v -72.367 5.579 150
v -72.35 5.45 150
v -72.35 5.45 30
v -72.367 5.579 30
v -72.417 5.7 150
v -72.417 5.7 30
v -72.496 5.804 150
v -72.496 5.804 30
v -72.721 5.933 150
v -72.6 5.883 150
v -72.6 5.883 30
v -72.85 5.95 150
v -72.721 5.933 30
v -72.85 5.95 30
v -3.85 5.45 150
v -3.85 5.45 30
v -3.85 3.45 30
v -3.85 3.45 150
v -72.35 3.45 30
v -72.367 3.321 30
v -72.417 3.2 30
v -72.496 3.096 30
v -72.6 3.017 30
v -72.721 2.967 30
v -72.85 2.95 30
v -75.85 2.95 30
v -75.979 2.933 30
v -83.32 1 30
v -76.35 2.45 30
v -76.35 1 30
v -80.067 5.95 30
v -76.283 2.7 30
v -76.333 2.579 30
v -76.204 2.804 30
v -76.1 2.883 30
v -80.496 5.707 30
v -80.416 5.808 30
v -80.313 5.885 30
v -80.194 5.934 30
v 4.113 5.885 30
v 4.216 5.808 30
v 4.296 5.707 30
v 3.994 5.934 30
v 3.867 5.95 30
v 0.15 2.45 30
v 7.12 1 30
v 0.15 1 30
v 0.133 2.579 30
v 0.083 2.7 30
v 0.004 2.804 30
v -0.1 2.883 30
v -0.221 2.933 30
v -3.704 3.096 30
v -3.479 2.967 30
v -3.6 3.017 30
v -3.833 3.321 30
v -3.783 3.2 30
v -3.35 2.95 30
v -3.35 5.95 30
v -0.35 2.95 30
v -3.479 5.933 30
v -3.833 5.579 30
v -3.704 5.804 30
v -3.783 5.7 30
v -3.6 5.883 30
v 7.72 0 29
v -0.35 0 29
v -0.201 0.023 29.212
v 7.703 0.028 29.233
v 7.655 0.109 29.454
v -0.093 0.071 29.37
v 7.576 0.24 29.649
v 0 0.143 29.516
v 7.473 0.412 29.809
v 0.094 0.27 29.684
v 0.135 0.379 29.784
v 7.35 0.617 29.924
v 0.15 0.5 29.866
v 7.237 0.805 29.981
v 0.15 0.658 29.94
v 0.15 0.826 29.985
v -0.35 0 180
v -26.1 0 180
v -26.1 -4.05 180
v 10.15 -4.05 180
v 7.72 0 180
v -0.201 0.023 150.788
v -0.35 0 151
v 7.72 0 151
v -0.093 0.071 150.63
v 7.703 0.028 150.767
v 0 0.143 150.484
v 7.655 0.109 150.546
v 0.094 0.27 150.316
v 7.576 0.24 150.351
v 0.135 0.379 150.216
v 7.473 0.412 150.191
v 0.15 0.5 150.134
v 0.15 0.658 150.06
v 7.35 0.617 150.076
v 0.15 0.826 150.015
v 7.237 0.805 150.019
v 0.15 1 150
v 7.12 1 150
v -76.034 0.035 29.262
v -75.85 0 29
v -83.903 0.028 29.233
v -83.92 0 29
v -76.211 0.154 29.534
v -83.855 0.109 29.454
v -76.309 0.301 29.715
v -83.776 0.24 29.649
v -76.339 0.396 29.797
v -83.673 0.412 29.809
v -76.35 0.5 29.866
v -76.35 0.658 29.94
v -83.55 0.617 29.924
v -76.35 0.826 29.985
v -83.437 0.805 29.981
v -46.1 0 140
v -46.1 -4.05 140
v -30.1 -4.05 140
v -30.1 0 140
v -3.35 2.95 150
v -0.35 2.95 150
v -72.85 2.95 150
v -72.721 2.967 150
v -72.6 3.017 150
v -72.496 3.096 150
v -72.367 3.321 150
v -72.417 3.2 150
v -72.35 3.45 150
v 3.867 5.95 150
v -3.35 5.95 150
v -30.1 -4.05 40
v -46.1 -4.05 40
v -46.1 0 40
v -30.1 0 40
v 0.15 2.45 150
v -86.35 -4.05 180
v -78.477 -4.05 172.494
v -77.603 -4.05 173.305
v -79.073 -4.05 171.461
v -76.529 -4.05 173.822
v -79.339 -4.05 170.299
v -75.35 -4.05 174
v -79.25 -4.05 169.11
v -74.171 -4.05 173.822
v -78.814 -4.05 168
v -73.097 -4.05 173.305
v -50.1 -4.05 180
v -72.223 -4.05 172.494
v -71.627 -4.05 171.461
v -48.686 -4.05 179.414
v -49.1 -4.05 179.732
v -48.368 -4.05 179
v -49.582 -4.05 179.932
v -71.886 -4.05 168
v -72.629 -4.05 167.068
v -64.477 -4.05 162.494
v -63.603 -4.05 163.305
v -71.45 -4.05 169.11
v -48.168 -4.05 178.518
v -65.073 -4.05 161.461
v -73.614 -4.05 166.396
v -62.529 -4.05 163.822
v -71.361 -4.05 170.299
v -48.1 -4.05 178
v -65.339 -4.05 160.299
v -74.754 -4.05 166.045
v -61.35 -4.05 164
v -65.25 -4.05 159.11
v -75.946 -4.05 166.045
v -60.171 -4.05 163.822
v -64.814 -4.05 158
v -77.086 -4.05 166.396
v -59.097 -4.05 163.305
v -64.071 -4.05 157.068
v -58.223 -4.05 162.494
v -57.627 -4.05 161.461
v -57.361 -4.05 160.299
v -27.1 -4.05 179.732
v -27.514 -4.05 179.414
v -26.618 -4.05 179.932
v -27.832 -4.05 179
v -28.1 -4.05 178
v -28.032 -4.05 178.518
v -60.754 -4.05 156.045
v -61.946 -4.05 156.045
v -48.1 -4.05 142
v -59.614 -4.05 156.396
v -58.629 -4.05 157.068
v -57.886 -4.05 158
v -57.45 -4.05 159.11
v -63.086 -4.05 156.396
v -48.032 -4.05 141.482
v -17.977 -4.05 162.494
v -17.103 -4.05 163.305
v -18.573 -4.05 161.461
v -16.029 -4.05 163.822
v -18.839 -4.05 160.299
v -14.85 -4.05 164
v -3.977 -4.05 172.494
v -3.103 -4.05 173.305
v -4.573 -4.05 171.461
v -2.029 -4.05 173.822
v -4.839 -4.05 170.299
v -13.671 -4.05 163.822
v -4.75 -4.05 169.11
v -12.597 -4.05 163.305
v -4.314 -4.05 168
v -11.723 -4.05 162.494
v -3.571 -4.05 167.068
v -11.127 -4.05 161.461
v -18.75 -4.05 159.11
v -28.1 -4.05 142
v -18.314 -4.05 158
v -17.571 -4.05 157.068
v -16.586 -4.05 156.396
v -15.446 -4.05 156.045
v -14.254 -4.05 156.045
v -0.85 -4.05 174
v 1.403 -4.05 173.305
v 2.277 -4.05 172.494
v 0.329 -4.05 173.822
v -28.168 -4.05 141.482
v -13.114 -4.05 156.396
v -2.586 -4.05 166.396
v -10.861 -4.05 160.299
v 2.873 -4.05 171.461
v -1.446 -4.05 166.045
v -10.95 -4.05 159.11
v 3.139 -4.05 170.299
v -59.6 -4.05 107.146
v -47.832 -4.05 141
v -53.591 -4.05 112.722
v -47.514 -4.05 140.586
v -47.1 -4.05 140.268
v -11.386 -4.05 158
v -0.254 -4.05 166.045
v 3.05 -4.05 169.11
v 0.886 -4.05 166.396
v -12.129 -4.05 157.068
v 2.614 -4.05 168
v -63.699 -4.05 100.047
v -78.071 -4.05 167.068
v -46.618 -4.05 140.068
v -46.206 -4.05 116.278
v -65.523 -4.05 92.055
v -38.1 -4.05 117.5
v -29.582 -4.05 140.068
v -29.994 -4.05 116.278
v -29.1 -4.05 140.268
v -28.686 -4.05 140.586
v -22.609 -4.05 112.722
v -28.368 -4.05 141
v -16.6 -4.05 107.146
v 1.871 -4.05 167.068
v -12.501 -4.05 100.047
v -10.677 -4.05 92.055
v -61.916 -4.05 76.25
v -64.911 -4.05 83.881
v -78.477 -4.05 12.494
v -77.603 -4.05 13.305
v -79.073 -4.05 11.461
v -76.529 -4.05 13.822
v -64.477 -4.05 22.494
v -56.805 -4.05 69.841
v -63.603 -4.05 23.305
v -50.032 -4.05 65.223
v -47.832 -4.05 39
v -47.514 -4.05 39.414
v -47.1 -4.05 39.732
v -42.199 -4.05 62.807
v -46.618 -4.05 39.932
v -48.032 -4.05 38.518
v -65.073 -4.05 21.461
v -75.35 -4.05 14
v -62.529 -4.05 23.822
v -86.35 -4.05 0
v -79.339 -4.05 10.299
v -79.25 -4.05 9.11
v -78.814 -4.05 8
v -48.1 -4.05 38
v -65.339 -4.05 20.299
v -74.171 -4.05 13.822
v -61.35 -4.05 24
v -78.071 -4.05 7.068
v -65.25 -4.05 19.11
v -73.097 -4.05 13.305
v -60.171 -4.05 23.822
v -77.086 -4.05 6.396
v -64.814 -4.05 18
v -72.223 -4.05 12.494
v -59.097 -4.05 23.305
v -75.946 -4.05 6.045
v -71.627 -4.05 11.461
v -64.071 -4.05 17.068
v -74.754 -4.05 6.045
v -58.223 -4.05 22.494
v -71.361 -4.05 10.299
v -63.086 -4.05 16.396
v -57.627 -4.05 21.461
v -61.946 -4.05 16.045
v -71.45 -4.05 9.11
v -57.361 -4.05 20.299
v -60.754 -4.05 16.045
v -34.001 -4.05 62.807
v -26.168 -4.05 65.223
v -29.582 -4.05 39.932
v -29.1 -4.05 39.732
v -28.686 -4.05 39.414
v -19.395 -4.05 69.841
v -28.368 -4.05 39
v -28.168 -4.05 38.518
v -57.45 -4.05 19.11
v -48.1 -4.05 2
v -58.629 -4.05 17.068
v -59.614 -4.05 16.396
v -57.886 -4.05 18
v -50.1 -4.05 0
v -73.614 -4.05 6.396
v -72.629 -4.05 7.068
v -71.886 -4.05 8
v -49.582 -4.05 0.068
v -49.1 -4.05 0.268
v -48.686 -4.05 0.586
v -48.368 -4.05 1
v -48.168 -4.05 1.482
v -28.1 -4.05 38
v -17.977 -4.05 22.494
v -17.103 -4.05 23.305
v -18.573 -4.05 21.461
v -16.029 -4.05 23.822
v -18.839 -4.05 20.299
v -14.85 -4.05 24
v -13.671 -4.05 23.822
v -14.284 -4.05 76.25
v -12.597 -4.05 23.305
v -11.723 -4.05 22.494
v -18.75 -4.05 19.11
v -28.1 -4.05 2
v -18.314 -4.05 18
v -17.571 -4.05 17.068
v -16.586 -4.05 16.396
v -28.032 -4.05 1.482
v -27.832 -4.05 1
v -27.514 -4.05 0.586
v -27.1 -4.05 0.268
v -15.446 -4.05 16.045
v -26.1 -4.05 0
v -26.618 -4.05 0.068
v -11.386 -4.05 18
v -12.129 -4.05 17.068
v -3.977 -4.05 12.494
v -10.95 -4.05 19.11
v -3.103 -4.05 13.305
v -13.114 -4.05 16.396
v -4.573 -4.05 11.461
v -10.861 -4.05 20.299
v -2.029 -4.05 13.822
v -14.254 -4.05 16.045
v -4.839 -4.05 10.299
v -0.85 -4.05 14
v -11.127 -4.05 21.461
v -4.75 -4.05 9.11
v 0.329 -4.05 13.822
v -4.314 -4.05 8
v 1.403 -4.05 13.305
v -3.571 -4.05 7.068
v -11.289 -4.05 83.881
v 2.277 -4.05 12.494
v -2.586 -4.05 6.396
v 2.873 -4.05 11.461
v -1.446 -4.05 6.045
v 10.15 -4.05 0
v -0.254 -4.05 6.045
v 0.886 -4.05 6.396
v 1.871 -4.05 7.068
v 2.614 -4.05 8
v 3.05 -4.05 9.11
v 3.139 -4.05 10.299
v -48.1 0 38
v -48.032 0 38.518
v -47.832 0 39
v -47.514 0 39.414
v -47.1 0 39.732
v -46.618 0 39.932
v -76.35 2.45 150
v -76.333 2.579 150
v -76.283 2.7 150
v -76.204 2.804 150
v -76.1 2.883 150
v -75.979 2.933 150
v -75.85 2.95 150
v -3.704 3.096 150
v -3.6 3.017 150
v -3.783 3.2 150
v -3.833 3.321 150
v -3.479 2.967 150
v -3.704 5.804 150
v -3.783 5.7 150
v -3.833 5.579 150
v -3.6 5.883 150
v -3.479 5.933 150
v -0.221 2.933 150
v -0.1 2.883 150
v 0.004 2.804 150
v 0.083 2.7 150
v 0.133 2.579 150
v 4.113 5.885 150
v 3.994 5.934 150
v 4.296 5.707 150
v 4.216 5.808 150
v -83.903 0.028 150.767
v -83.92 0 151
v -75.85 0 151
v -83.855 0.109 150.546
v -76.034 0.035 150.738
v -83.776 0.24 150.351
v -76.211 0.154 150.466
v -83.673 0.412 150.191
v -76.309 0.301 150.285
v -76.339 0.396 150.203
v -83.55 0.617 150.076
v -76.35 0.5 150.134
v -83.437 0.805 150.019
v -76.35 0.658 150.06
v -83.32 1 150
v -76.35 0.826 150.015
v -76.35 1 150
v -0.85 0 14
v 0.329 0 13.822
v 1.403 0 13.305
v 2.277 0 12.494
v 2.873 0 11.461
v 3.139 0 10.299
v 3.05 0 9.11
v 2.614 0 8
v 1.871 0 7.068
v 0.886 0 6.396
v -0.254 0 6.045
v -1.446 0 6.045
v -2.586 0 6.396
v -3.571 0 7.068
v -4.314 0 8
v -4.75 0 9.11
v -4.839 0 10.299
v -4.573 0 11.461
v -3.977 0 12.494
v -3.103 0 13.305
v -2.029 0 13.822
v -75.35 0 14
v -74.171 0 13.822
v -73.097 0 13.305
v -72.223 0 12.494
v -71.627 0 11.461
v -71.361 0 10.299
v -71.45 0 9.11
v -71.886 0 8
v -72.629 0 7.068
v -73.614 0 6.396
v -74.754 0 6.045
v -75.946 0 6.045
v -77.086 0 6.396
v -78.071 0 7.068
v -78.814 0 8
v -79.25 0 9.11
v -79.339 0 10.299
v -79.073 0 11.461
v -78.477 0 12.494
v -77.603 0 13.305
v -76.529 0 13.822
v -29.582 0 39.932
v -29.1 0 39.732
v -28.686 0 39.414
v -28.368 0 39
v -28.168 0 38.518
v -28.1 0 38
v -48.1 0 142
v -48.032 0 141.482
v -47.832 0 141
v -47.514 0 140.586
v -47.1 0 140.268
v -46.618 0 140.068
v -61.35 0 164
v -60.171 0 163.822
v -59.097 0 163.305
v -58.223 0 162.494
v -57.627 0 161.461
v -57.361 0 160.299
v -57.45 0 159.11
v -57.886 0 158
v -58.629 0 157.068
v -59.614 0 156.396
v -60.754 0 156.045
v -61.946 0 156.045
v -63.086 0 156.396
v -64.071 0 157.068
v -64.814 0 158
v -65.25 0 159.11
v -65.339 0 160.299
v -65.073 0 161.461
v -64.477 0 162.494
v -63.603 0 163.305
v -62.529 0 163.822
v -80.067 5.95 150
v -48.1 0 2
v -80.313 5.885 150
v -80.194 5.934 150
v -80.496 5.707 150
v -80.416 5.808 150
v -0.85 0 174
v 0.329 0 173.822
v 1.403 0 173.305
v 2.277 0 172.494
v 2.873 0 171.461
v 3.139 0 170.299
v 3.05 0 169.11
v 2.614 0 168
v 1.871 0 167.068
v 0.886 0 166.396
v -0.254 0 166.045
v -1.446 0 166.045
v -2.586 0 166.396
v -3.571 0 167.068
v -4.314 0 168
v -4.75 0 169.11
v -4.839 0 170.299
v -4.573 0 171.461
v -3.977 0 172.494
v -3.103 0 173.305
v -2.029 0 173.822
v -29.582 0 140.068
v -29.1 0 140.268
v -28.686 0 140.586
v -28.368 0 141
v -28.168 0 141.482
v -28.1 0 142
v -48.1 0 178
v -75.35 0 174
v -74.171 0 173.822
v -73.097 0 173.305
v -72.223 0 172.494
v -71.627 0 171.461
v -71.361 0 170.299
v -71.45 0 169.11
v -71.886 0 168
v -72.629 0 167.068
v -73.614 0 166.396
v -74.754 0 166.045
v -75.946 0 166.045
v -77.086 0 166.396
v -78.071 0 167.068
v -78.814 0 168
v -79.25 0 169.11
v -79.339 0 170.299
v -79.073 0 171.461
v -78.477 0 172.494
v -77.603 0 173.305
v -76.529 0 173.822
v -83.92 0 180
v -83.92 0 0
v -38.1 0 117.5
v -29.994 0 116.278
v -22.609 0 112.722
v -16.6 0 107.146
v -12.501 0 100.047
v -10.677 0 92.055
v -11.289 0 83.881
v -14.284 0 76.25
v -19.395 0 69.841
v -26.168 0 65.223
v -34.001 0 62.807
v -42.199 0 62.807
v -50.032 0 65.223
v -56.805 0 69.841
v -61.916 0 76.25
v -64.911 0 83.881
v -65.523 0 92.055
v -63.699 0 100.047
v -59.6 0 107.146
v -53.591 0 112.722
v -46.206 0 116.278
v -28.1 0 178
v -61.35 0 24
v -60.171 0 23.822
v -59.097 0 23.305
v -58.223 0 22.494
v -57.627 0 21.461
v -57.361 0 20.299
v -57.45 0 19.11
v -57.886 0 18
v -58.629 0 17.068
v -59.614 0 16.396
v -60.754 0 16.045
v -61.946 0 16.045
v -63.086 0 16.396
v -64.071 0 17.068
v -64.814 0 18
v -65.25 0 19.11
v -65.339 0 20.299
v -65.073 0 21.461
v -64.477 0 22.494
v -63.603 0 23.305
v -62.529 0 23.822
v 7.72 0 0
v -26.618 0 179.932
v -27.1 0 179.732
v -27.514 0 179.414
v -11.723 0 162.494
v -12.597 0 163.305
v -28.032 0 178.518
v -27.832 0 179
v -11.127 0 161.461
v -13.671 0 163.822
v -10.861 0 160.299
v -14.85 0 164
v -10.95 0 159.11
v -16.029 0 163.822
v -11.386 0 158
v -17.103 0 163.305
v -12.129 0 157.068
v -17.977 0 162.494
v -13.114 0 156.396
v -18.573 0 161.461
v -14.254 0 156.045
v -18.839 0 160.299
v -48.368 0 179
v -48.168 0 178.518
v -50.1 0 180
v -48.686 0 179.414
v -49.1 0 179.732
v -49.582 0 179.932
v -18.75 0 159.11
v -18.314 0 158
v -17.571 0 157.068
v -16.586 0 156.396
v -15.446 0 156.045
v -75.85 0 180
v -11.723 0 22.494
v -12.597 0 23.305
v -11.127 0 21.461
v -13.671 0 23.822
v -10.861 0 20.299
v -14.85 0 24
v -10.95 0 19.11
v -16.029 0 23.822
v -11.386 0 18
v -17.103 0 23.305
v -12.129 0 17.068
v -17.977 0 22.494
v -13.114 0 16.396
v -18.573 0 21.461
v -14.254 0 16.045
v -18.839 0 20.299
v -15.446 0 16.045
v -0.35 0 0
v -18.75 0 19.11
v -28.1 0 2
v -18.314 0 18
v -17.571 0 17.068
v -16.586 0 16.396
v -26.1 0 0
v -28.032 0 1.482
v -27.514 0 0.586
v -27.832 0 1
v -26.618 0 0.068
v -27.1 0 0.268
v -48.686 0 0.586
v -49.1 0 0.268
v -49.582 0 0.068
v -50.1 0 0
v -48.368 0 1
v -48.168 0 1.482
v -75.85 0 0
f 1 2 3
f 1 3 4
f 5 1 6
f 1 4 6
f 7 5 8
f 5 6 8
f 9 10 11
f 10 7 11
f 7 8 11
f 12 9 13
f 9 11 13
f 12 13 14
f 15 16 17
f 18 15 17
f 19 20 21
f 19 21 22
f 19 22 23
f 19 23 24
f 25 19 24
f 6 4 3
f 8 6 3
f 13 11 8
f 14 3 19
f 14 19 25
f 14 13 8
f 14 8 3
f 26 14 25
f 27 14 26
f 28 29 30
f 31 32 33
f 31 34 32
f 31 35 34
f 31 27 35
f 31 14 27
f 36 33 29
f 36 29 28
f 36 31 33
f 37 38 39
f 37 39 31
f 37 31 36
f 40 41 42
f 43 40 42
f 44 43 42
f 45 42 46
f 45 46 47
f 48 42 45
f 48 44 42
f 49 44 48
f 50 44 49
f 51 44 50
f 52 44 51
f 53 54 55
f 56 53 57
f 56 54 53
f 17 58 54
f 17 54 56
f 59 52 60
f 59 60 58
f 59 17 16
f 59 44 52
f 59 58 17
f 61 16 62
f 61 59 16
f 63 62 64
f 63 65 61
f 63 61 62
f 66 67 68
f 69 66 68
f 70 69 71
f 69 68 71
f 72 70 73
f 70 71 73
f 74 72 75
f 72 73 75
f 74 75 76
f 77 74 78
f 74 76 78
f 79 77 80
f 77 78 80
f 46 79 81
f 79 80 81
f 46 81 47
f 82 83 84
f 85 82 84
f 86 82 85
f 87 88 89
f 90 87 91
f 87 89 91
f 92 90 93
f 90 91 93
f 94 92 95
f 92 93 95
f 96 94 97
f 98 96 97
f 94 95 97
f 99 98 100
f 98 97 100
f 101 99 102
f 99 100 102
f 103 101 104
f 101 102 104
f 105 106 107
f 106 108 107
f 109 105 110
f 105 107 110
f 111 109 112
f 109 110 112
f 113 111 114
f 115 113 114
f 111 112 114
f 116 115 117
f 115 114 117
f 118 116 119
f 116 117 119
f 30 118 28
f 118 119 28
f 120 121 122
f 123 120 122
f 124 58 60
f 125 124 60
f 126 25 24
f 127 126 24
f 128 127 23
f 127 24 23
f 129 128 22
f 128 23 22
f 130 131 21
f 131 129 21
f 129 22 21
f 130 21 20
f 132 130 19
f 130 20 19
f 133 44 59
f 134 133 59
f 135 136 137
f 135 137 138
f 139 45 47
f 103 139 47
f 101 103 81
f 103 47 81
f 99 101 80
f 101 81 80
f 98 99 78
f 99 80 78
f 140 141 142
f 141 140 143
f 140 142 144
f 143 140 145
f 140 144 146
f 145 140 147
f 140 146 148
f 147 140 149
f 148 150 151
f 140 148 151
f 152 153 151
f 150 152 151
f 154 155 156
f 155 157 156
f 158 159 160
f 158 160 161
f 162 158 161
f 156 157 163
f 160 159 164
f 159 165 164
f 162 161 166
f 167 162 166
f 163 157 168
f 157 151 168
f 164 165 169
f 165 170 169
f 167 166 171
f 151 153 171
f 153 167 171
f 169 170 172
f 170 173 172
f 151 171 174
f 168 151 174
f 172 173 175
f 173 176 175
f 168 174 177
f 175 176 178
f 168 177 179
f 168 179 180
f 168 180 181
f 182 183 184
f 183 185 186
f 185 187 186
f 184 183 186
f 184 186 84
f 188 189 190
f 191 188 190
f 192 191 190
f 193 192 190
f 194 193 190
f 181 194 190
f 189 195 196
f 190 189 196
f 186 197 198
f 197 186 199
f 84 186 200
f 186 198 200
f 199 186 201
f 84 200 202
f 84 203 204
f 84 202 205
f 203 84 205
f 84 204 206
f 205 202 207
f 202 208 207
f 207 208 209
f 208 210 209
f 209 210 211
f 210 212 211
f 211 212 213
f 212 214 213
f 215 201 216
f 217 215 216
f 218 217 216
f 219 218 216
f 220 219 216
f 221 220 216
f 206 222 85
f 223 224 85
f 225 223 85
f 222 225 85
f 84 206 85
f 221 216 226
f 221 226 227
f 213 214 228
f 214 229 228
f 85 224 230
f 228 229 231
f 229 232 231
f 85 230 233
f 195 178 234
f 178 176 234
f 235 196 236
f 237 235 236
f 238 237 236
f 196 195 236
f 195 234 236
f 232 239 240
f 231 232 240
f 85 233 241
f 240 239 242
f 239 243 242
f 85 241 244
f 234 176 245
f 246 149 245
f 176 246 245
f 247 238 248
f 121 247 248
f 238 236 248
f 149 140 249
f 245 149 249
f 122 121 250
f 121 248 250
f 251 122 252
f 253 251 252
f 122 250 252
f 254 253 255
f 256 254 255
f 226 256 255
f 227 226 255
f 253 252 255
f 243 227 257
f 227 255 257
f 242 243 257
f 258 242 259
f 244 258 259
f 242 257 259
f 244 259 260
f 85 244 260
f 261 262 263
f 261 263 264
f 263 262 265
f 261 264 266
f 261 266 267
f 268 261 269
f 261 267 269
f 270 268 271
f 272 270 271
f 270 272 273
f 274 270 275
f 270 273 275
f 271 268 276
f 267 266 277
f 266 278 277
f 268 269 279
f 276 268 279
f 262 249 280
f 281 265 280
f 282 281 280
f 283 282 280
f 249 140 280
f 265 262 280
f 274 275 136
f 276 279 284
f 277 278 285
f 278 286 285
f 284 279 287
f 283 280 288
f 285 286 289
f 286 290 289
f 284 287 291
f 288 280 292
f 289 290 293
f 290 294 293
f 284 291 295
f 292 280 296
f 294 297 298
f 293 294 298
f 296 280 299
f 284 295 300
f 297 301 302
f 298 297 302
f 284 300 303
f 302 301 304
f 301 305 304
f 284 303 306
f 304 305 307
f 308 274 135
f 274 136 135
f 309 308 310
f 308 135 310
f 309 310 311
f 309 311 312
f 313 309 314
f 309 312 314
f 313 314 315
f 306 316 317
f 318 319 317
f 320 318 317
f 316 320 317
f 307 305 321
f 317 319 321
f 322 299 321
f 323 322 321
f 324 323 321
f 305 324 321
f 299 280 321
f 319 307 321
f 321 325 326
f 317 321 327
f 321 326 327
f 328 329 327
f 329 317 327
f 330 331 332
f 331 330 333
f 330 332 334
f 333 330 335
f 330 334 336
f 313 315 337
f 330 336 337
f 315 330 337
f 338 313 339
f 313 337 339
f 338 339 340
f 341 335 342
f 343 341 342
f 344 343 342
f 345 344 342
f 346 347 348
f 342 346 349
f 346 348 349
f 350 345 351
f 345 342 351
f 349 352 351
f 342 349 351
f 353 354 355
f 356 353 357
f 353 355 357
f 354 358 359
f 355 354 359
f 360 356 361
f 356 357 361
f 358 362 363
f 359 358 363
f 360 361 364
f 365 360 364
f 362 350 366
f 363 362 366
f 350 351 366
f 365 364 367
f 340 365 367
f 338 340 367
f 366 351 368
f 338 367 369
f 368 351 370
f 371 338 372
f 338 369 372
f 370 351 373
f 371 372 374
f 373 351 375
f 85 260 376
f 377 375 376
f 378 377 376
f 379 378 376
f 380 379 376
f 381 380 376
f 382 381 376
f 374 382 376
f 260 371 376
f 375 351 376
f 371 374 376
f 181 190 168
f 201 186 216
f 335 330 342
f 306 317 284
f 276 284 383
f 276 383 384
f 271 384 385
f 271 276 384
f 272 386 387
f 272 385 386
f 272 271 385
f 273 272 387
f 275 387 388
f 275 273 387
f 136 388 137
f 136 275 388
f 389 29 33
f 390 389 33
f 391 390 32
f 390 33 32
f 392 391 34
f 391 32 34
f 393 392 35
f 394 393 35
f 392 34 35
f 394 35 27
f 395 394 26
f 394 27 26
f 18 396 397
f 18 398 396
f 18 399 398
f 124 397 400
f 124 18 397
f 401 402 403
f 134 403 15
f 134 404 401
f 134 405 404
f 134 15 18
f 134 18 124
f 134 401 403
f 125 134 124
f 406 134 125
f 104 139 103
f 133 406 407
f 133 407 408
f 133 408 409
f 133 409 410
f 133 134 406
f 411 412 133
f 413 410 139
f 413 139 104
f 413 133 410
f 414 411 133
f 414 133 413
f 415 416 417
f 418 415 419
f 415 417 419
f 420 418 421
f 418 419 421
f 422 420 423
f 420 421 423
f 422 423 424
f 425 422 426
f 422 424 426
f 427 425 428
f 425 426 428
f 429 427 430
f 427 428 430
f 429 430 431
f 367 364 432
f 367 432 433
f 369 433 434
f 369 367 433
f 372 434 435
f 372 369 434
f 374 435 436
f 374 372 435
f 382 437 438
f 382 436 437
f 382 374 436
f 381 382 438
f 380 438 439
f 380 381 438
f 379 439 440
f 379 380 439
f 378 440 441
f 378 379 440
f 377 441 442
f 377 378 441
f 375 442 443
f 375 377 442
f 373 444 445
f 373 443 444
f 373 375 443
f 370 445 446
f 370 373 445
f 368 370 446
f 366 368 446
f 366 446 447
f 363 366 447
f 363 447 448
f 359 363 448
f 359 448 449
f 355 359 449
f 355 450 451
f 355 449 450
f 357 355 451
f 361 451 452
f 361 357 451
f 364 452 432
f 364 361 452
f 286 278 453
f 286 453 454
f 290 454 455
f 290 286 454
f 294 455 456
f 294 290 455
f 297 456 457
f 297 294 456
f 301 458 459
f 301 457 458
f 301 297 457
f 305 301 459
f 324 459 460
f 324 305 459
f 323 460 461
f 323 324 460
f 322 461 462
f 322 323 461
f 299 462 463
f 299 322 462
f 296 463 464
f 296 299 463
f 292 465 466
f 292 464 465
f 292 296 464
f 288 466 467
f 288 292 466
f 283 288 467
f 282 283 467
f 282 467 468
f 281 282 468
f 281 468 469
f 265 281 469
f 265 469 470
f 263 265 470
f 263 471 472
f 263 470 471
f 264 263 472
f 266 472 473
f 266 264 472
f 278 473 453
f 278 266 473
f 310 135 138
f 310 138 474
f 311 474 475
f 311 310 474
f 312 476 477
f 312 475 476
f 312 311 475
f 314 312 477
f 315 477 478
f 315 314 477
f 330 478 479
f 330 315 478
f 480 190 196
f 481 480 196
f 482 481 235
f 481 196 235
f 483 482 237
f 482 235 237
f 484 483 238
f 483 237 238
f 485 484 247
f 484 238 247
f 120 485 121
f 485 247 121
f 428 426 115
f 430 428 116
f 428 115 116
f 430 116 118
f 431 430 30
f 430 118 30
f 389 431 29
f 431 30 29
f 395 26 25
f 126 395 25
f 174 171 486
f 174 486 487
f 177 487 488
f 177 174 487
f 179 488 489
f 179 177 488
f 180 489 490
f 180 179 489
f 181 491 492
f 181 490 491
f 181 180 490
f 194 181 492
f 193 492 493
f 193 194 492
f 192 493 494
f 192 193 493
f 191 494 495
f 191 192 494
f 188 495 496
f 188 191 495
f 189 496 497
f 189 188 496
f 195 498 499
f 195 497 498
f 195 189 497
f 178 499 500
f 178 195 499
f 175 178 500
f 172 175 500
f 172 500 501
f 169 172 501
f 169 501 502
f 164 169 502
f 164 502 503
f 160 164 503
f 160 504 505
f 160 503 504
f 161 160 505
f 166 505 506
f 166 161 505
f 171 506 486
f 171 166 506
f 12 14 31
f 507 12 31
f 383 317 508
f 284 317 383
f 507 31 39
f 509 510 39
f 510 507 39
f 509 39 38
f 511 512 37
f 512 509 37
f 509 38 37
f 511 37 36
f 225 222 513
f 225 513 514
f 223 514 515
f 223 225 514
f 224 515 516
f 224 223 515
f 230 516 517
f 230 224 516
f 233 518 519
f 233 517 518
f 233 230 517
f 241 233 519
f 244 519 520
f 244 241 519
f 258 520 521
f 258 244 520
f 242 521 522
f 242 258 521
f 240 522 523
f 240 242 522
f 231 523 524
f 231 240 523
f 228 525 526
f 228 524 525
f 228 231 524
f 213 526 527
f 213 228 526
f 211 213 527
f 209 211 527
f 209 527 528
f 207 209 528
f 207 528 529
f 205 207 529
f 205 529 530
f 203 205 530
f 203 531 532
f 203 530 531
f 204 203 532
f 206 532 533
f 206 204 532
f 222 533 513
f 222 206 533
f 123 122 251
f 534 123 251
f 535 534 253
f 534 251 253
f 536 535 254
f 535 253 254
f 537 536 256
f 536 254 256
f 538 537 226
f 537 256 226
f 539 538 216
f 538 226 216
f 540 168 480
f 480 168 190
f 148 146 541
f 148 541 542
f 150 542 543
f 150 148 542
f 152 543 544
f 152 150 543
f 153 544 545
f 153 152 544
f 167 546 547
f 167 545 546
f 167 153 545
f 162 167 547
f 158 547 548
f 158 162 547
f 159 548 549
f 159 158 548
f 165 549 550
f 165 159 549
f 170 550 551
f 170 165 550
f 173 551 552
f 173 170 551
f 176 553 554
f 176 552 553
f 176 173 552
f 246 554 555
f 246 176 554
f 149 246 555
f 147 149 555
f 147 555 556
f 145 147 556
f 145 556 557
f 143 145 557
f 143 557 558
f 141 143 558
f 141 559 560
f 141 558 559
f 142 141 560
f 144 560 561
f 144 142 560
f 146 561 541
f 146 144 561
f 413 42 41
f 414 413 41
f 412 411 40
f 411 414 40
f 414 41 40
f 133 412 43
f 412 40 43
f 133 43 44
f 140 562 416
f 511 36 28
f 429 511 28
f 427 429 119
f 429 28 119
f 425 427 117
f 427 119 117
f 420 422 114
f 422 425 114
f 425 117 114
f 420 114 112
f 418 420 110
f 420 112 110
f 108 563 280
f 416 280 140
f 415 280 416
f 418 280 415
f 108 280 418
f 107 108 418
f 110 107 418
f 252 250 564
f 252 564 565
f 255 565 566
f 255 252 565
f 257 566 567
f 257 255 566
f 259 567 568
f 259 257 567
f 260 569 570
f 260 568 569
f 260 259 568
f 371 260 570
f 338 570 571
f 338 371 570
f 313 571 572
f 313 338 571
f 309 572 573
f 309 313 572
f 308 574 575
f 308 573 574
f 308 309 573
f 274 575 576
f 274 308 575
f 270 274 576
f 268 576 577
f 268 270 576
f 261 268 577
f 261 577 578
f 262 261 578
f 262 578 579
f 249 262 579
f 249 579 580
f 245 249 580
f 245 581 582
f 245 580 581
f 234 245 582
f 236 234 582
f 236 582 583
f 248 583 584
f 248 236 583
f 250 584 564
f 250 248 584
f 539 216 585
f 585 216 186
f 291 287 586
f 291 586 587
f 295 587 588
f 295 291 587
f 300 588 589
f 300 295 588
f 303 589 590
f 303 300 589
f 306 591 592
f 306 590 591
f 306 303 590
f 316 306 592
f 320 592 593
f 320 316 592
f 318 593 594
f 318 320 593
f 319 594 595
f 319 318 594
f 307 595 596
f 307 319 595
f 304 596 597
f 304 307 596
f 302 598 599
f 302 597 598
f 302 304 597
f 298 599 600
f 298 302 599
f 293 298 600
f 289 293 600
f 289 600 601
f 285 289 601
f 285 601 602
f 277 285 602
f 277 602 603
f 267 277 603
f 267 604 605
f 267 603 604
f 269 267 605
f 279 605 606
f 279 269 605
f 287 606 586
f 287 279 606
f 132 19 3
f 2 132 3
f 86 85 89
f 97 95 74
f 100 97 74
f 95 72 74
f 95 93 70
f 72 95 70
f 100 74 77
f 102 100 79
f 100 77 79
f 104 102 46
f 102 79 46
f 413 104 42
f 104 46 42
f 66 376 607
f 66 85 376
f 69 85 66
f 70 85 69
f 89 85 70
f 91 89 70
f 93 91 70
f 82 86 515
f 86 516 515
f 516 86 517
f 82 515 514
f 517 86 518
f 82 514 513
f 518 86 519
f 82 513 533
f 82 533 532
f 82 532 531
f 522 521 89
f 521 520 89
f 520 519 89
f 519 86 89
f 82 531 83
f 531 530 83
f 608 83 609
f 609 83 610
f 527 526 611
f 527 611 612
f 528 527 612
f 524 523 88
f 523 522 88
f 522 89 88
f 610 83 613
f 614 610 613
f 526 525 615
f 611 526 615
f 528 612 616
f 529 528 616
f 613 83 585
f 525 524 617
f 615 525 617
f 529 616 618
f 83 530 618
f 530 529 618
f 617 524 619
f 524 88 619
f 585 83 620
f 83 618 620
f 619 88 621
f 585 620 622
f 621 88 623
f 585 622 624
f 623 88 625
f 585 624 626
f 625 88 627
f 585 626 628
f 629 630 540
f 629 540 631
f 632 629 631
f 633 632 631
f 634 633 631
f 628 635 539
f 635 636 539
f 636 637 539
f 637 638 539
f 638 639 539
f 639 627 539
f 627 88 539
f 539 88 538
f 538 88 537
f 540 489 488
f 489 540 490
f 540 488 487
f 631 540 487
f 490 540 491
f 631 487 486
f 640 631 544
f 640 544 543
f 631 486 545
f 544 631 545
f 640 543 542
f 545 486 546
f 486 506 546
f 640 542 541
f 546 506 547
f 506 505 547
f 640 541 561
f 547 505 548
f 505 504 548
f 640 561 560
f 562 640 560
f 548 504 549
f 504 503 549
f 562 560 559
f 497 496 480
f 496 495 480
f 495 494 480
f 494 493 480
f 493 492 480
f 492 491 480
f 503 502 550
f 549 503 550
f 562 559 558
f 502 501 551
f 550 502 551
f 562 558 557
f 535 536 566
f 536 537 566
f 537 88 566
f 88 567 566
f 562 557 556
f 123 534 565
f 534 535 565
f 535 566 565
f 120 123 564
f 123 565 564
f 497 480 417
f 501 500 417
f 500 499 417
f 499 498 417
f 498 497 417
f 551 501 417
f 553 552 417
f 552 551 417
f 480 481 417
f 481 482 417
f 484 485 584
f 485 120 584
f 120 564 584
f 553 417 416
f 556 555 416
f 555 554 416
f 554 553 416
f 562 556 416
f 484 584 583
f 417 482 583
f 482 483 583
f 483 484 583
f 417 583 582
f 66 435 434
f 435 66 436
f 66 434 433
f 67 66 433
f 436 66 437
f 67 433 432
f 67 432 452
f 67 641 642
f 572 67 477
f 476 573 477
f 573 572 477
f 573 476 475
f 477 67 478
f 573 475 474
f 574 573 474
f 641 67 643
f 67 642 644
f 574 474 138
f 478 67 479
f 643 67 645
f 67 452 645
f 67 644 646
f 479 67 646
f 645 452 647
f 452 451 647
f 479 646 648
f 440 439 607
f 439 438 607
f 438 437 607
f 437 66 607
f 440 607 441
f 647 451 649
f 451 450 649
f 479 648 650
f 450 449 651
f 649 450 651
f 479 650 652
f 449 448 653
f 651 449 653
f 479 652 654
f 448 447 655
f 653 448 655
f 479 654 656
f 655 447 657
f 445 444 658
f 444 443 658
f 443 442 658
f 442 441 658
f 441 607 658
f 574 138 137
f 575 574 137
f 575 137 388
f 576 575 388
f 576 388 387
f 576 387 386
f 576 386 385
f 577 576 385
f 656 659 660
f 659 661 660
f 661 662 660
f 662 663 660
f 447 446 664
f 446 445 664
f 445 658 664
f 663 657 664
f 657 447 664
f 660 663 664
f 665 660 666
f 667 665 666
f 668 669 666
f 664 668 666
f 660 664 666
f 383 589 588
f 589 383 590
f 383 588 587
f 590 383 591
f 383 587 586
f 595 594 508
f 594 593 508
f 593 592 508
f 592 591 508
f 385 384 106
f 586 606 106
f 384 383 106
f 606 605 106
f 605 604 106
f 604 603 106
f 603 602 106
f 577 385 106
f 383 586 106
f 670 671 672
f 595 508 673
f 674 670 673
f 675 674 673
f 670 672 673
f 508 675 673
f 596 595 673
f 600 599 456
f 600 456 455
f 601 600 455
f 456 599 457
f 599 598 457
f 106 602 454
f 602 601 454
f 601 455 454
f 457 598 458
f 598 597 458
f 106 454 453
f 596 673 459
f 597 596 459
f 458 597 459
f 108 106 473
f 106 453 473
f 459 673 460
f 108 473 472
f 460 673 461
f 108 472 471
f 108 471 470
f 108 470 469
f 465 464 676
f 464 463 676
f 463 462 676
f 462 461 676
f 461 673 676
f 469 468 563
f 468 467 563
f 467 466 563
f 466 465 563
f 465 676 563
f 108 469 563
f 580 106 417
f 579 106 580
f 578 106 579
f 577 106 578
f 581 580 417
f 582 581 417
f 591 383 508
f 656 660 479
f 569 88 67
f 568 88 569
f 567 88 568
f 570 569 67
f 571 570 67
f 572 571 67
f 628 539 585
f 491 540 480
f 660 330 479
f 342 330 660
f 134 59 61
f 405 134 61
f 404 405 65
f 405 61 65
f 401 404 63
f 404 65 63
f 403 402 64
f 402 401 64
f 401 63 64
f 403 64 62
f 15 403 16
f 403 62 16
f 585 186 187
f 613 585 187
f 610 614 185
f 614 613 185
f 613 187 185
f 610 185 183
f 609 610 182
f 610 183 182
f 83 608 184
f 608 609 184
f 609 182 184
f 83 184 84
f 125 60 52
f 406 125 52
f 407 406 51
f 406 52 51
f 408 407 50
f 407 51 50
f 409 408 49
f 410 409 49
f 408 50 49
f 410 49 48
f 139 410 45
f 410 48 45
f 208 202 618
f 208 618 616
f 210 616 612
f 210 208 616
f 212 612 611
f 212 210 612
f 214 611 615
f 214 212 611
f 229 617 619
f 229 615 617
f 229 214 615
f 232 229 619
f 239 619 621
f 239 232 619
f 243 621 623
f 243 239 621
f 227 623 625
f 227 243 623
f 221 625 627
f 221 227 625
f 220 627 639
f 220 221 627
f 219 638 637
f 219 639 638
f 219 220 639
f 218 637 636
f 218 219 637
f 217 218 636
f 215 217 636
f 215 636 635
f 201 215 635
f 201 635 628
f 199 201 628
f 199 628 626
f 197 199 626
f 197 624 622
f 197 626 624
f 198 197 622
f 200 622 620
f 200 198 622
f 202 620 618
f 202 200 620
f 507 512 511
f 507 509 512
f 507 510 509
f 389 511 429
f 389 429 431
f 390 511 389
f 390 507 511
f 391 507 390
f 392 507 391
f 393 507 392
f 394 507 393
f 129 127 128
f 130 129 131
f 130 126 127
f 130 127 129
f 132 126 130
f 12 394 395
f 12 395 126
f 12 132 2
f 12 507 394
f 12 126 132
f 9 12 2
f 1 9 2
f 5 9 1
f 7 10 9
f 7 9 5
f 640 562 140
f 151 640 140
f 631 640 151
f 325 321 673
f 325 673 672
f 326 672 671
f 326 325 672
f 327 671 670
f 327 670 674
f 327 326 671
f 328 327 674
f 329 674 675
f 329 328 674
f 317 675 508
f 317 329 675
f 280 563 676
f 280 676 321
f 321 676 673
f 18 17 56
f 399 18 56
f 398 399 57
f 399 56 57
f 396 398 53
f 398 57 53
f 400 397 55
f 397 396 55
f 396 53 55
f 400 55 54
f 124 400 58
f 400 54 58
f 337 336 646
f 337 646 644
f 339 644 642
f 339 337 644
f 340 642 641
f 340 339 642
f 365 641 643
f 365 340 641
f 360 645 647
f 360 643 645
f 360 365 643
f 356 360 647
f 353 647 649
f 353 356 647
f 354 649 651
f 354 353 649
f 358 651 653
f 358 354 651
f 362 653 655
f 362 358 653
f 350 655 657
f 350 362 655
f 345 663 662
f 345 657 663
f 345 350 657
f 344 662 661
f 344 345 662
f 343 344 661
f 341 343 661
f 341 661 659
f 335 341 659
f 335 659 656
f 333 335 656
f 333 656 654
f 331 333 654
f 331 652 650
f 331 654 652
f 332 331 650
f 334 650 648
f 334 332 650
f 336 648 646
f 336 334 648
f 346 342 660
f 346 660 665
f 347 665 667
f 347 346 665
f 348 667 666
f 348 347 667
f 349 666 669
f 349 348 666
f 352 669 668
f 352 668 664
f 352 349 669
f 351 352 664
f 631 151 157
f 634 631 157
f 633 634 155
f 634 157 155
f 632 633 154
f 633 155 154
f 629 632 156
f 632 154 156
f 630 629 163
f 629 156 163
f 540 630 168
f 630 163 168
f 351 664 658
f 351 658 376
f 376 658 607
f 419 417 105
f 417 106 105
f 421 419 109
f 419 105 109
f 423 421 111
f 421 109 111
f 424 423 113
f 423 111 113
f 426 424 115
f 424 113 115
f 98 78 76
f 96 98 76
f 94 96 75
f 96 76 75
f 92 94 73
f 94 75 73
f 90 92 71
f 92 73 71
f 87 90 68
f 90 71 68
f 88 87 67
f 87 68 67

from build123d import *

# Parameters (mm, degrees)
BOSS_EXTRUDE1_DEPTH     = 180
SKETCH2_W               = 91.64
SKETCH2_H               = 8.017032047
CUT_EXTRUDE1_DEPTH      = 30
SKETCH3_W               = 91.64
SKETCH3_H               = 8.483725915
CUT_EXTRUDE2_DEPTH      = 30
FILLET1_R               = 1
FILLET2_R               = 1
FILLET3_R               = 1
CUT_EXTRUDE3_DEPTH      = 200.729129072
CUT_EXTRUDE3_DEPTH_BACK = 200.729129072
SKETCH4_R               = 4
SKETCH4_R_2             = 27.5


with BuildPart() as part:
    # Sketch1 → Boss-Extrude1 (new body)
    with BuildSketch(Plane.XY):
        with BuildLine():
            Line((-80.35, -4.05), (-79.85, -4.05))
            Line((-79.85, -4.05), (3.65, -4.05))
            Line((3.65, -4.05), (4.15, -4.05))
            Line((4.15, -4.05), (10.15, -4.05))
            Line((10.15, -4.05), (4.295651273, 5.707247878))
            ThreePointArc((4.295651273, 5.707247878), (4.113254218, 5.885099953), (3.866904811, 5.95))
            Line((3.866904811, 5.95), (3.65, 5.95))
            Line((3.65, 5.95), (-3.35, 5.95))
            ThreePointArc((-3.35, 5.95), (-3.703553391, 5.803553391), (-3.85, 5.45))
            Line((-3.85, 5.45), (-3.85, 3.45))
            ThreePointArc((-3.85, 3.45), (-3.703553391, 3.096446609), (-3.35, 2.95))
            Line((-3.35, 2.95), (-0.35, 2.95))
            ThreePointArc((-0.35, 2.95), (0.003553391, 2.803553391), (0.15, 2.45))
            Line((0.15, 2.45), (0.15, 0.5))
            ThreePointArc((0.15, 0.5), (0.003553391, 0.146446609), (-0.35, 0))
            Line((-0.35, 0), (-75.85, 0))
            ThreePointArc((-75.85, 0), (-76.203553391, 0.146446609), (-76.35, 0.5))
            Line((-76.35, 0.5), (-76.35, 2.45))
            ThreePointArc((-76.35, 2.45), (-76.203553391, 2.803553391), (-75.85, 2.95))
            Line((-75.85, 2.95), (-72.85, 2.95))
            ThreePointArc((-72.85, 2.95), (-72.496446609, 3.096446609), (-72.35, 3.45))
            Line((-72.35, 3.45), (-72.35, 5.45))
            ThreePointArc((-72.35, 5.45), (-72.496446609, 5.803553391), (-72.85, 5.95))
            Line((-72.85, 5.95), (-79.85, 5.95))
            Line((-79.85, 5.95), (-80.066904811, 5.95))
            ThreePointArc((-80.066904811, 5.95), (-80.313254218, 5.885099953), (-80.495651273, 5.707247878))
            Line((-80.495651273, 5.707247878), (-86.35, -4.05))
            Line((-86.35, -4.05), (-80.35, -4.05))
        make_face()
    extrude(amount=BOSS_EXTRUDE1_DEPTH)

    # Sketch2 → Cut-Extrude1 (cut)
    with BuildSketch(Plane.XY.offset(180)):
        with Locations((-38.1, 4.008516024)):
            Rectangle(SKETCH2_W, SKETCH2_H)
    extrude(amount=-CUT_EXTRUDE1_DEPTH, mode=Mode.SUBTRACT)

    # Sketch3 → Cut-Extrude2 (cut)
    with BuildSketch(Plane(origin=(0, 0, 0), x_dir=(-1, 0, 0), z_dir=(0, 0, -1))):
        with Locations((38.1, 4.241862958)):
            Rectangle(SKETCH3_W, SKETCH3_H)
    extrude(amount=-CUT_EXTRUDE2_DEPTH, mode=Mode.SUBTRACT)

    # Fillet1
    fillet1_edges = [part.edges().sort_by_distance(p)[0] for p in [
        (-79.885, 0, 150),
    ]]
    fillet(fillet1_edges, radius=FILLET1_R)

    # Fillet2
    fillet2_edges = [part.edges().sort_by_distance(p)[0] for p in [
        (3.685, 0, 150),
    ]]
    fillet(fillet2_edges, radius=FILLET2_R)

    # Fillet3
    fillet3_edges = [part.edges().sort_by_distance(p)[0] for p in [
        (-79.885, 0, 30),
        (3.685, 0, 30),
    ]]
    fillet(fillet3_edges, radius=FILLET3_R)

    # Sketch4 → Cut-Extrude3 (cut, two sides: drawn at the far end of the back side and taken through both)
    with BuildSketch(Plane(origin=(0, 0, 0), x_dir=(1, 0, 0), z_dir=(0, 1, 0)).offset(-CUT_EXTRUDE3_DEPTH_BACK)):
        with BuildLine():
            Line((-28.1, -38), (-28.1, -2))
            ThreePointArc((-28.1, -2), (-27.514213562, -0.585786438), (-26.1, 0))
            Line((-26.1, 0), (-50.1, 0))
            ThreePointArc((-50.1, 0), (-48.685786438, -0.585786438), (-48.1, -2))
            Line((-48.1, -2), (-48.1, -38))
            ThreePointArc((-48.1, -38), (-47.514213562, -39.414213562), (-46.1, -40))
            Line((-46.1, -40), (-30.1, -40))
            ThreePointArc((-30.1, -40), (-28.685786438, -39.414213562), (-28.1, -38))
        make_face()
        with Locations(Location((-75.35, -10, 0), (0, 0, 270))):
            Circle(SKETCH4_R)
        with Locations(Location((-61.35, -20, 0), (0, 0, 270))):
            Circle(SKETCH4_R)
        with Locations(Location((-14.85, -20, 0), (0, 0, 270))):
            Circle(SKETCH4_R)
        with Locations(Location((-0.85, -10, 0), (0, 0, 270))):
            Circle(SKETCH4_R)
        with Locations(Location((-38.1, -90, 0), (0, 0, 270))):
            Circle(SKETCH4_R_2)
        with BuildLine():
            ThreePointArc((-30.1, -140), (-28.685786438, -140.585786438), (-28.1, -142))
            Line((-28.1, -142), (-28.1, -178))
            ThreePointArc((-28.1, -178), (-27.514213562, -179.414213562), (-26.1, -180))
            Line((-26.1, -180), (-50.1, -180))
            ThreePointArc((-50.1, -180), (-48.685786438, -179.414213562), (-48.1, -178))
            Line((-48.1, -178), (-48.1, -142))
            ThreePointArc((-48.1, -142), (-47.514213562, -140.585786438), (-46.1, -140))
            Line((-46.1, -140), (-30.1, -140))
        make_face()
        with Locations(Location((-61.35, -160, 0), (0, 0, 270))):
            Circle(SKETCH4_R)
        with Locations(Location((-75.35, -170, 0), (0, 0, 270))):
            Circle(SKETCH4_R)
        with Locations(Location((-14.85, -160, 0), (0, 0, 270))):
            Circle(SKETCH4_R)
        with Locations(Location((-0.85, -170, 0), (0, 0, 270))):
            Circle(SKETCH4_R)
    extrude(amount=CUT_EXTRUDE3_DEPTH + CUT_EXTRUDE3_DEPTH_BACK, mode=Mode.SUBTRACT)


solid = part.part
